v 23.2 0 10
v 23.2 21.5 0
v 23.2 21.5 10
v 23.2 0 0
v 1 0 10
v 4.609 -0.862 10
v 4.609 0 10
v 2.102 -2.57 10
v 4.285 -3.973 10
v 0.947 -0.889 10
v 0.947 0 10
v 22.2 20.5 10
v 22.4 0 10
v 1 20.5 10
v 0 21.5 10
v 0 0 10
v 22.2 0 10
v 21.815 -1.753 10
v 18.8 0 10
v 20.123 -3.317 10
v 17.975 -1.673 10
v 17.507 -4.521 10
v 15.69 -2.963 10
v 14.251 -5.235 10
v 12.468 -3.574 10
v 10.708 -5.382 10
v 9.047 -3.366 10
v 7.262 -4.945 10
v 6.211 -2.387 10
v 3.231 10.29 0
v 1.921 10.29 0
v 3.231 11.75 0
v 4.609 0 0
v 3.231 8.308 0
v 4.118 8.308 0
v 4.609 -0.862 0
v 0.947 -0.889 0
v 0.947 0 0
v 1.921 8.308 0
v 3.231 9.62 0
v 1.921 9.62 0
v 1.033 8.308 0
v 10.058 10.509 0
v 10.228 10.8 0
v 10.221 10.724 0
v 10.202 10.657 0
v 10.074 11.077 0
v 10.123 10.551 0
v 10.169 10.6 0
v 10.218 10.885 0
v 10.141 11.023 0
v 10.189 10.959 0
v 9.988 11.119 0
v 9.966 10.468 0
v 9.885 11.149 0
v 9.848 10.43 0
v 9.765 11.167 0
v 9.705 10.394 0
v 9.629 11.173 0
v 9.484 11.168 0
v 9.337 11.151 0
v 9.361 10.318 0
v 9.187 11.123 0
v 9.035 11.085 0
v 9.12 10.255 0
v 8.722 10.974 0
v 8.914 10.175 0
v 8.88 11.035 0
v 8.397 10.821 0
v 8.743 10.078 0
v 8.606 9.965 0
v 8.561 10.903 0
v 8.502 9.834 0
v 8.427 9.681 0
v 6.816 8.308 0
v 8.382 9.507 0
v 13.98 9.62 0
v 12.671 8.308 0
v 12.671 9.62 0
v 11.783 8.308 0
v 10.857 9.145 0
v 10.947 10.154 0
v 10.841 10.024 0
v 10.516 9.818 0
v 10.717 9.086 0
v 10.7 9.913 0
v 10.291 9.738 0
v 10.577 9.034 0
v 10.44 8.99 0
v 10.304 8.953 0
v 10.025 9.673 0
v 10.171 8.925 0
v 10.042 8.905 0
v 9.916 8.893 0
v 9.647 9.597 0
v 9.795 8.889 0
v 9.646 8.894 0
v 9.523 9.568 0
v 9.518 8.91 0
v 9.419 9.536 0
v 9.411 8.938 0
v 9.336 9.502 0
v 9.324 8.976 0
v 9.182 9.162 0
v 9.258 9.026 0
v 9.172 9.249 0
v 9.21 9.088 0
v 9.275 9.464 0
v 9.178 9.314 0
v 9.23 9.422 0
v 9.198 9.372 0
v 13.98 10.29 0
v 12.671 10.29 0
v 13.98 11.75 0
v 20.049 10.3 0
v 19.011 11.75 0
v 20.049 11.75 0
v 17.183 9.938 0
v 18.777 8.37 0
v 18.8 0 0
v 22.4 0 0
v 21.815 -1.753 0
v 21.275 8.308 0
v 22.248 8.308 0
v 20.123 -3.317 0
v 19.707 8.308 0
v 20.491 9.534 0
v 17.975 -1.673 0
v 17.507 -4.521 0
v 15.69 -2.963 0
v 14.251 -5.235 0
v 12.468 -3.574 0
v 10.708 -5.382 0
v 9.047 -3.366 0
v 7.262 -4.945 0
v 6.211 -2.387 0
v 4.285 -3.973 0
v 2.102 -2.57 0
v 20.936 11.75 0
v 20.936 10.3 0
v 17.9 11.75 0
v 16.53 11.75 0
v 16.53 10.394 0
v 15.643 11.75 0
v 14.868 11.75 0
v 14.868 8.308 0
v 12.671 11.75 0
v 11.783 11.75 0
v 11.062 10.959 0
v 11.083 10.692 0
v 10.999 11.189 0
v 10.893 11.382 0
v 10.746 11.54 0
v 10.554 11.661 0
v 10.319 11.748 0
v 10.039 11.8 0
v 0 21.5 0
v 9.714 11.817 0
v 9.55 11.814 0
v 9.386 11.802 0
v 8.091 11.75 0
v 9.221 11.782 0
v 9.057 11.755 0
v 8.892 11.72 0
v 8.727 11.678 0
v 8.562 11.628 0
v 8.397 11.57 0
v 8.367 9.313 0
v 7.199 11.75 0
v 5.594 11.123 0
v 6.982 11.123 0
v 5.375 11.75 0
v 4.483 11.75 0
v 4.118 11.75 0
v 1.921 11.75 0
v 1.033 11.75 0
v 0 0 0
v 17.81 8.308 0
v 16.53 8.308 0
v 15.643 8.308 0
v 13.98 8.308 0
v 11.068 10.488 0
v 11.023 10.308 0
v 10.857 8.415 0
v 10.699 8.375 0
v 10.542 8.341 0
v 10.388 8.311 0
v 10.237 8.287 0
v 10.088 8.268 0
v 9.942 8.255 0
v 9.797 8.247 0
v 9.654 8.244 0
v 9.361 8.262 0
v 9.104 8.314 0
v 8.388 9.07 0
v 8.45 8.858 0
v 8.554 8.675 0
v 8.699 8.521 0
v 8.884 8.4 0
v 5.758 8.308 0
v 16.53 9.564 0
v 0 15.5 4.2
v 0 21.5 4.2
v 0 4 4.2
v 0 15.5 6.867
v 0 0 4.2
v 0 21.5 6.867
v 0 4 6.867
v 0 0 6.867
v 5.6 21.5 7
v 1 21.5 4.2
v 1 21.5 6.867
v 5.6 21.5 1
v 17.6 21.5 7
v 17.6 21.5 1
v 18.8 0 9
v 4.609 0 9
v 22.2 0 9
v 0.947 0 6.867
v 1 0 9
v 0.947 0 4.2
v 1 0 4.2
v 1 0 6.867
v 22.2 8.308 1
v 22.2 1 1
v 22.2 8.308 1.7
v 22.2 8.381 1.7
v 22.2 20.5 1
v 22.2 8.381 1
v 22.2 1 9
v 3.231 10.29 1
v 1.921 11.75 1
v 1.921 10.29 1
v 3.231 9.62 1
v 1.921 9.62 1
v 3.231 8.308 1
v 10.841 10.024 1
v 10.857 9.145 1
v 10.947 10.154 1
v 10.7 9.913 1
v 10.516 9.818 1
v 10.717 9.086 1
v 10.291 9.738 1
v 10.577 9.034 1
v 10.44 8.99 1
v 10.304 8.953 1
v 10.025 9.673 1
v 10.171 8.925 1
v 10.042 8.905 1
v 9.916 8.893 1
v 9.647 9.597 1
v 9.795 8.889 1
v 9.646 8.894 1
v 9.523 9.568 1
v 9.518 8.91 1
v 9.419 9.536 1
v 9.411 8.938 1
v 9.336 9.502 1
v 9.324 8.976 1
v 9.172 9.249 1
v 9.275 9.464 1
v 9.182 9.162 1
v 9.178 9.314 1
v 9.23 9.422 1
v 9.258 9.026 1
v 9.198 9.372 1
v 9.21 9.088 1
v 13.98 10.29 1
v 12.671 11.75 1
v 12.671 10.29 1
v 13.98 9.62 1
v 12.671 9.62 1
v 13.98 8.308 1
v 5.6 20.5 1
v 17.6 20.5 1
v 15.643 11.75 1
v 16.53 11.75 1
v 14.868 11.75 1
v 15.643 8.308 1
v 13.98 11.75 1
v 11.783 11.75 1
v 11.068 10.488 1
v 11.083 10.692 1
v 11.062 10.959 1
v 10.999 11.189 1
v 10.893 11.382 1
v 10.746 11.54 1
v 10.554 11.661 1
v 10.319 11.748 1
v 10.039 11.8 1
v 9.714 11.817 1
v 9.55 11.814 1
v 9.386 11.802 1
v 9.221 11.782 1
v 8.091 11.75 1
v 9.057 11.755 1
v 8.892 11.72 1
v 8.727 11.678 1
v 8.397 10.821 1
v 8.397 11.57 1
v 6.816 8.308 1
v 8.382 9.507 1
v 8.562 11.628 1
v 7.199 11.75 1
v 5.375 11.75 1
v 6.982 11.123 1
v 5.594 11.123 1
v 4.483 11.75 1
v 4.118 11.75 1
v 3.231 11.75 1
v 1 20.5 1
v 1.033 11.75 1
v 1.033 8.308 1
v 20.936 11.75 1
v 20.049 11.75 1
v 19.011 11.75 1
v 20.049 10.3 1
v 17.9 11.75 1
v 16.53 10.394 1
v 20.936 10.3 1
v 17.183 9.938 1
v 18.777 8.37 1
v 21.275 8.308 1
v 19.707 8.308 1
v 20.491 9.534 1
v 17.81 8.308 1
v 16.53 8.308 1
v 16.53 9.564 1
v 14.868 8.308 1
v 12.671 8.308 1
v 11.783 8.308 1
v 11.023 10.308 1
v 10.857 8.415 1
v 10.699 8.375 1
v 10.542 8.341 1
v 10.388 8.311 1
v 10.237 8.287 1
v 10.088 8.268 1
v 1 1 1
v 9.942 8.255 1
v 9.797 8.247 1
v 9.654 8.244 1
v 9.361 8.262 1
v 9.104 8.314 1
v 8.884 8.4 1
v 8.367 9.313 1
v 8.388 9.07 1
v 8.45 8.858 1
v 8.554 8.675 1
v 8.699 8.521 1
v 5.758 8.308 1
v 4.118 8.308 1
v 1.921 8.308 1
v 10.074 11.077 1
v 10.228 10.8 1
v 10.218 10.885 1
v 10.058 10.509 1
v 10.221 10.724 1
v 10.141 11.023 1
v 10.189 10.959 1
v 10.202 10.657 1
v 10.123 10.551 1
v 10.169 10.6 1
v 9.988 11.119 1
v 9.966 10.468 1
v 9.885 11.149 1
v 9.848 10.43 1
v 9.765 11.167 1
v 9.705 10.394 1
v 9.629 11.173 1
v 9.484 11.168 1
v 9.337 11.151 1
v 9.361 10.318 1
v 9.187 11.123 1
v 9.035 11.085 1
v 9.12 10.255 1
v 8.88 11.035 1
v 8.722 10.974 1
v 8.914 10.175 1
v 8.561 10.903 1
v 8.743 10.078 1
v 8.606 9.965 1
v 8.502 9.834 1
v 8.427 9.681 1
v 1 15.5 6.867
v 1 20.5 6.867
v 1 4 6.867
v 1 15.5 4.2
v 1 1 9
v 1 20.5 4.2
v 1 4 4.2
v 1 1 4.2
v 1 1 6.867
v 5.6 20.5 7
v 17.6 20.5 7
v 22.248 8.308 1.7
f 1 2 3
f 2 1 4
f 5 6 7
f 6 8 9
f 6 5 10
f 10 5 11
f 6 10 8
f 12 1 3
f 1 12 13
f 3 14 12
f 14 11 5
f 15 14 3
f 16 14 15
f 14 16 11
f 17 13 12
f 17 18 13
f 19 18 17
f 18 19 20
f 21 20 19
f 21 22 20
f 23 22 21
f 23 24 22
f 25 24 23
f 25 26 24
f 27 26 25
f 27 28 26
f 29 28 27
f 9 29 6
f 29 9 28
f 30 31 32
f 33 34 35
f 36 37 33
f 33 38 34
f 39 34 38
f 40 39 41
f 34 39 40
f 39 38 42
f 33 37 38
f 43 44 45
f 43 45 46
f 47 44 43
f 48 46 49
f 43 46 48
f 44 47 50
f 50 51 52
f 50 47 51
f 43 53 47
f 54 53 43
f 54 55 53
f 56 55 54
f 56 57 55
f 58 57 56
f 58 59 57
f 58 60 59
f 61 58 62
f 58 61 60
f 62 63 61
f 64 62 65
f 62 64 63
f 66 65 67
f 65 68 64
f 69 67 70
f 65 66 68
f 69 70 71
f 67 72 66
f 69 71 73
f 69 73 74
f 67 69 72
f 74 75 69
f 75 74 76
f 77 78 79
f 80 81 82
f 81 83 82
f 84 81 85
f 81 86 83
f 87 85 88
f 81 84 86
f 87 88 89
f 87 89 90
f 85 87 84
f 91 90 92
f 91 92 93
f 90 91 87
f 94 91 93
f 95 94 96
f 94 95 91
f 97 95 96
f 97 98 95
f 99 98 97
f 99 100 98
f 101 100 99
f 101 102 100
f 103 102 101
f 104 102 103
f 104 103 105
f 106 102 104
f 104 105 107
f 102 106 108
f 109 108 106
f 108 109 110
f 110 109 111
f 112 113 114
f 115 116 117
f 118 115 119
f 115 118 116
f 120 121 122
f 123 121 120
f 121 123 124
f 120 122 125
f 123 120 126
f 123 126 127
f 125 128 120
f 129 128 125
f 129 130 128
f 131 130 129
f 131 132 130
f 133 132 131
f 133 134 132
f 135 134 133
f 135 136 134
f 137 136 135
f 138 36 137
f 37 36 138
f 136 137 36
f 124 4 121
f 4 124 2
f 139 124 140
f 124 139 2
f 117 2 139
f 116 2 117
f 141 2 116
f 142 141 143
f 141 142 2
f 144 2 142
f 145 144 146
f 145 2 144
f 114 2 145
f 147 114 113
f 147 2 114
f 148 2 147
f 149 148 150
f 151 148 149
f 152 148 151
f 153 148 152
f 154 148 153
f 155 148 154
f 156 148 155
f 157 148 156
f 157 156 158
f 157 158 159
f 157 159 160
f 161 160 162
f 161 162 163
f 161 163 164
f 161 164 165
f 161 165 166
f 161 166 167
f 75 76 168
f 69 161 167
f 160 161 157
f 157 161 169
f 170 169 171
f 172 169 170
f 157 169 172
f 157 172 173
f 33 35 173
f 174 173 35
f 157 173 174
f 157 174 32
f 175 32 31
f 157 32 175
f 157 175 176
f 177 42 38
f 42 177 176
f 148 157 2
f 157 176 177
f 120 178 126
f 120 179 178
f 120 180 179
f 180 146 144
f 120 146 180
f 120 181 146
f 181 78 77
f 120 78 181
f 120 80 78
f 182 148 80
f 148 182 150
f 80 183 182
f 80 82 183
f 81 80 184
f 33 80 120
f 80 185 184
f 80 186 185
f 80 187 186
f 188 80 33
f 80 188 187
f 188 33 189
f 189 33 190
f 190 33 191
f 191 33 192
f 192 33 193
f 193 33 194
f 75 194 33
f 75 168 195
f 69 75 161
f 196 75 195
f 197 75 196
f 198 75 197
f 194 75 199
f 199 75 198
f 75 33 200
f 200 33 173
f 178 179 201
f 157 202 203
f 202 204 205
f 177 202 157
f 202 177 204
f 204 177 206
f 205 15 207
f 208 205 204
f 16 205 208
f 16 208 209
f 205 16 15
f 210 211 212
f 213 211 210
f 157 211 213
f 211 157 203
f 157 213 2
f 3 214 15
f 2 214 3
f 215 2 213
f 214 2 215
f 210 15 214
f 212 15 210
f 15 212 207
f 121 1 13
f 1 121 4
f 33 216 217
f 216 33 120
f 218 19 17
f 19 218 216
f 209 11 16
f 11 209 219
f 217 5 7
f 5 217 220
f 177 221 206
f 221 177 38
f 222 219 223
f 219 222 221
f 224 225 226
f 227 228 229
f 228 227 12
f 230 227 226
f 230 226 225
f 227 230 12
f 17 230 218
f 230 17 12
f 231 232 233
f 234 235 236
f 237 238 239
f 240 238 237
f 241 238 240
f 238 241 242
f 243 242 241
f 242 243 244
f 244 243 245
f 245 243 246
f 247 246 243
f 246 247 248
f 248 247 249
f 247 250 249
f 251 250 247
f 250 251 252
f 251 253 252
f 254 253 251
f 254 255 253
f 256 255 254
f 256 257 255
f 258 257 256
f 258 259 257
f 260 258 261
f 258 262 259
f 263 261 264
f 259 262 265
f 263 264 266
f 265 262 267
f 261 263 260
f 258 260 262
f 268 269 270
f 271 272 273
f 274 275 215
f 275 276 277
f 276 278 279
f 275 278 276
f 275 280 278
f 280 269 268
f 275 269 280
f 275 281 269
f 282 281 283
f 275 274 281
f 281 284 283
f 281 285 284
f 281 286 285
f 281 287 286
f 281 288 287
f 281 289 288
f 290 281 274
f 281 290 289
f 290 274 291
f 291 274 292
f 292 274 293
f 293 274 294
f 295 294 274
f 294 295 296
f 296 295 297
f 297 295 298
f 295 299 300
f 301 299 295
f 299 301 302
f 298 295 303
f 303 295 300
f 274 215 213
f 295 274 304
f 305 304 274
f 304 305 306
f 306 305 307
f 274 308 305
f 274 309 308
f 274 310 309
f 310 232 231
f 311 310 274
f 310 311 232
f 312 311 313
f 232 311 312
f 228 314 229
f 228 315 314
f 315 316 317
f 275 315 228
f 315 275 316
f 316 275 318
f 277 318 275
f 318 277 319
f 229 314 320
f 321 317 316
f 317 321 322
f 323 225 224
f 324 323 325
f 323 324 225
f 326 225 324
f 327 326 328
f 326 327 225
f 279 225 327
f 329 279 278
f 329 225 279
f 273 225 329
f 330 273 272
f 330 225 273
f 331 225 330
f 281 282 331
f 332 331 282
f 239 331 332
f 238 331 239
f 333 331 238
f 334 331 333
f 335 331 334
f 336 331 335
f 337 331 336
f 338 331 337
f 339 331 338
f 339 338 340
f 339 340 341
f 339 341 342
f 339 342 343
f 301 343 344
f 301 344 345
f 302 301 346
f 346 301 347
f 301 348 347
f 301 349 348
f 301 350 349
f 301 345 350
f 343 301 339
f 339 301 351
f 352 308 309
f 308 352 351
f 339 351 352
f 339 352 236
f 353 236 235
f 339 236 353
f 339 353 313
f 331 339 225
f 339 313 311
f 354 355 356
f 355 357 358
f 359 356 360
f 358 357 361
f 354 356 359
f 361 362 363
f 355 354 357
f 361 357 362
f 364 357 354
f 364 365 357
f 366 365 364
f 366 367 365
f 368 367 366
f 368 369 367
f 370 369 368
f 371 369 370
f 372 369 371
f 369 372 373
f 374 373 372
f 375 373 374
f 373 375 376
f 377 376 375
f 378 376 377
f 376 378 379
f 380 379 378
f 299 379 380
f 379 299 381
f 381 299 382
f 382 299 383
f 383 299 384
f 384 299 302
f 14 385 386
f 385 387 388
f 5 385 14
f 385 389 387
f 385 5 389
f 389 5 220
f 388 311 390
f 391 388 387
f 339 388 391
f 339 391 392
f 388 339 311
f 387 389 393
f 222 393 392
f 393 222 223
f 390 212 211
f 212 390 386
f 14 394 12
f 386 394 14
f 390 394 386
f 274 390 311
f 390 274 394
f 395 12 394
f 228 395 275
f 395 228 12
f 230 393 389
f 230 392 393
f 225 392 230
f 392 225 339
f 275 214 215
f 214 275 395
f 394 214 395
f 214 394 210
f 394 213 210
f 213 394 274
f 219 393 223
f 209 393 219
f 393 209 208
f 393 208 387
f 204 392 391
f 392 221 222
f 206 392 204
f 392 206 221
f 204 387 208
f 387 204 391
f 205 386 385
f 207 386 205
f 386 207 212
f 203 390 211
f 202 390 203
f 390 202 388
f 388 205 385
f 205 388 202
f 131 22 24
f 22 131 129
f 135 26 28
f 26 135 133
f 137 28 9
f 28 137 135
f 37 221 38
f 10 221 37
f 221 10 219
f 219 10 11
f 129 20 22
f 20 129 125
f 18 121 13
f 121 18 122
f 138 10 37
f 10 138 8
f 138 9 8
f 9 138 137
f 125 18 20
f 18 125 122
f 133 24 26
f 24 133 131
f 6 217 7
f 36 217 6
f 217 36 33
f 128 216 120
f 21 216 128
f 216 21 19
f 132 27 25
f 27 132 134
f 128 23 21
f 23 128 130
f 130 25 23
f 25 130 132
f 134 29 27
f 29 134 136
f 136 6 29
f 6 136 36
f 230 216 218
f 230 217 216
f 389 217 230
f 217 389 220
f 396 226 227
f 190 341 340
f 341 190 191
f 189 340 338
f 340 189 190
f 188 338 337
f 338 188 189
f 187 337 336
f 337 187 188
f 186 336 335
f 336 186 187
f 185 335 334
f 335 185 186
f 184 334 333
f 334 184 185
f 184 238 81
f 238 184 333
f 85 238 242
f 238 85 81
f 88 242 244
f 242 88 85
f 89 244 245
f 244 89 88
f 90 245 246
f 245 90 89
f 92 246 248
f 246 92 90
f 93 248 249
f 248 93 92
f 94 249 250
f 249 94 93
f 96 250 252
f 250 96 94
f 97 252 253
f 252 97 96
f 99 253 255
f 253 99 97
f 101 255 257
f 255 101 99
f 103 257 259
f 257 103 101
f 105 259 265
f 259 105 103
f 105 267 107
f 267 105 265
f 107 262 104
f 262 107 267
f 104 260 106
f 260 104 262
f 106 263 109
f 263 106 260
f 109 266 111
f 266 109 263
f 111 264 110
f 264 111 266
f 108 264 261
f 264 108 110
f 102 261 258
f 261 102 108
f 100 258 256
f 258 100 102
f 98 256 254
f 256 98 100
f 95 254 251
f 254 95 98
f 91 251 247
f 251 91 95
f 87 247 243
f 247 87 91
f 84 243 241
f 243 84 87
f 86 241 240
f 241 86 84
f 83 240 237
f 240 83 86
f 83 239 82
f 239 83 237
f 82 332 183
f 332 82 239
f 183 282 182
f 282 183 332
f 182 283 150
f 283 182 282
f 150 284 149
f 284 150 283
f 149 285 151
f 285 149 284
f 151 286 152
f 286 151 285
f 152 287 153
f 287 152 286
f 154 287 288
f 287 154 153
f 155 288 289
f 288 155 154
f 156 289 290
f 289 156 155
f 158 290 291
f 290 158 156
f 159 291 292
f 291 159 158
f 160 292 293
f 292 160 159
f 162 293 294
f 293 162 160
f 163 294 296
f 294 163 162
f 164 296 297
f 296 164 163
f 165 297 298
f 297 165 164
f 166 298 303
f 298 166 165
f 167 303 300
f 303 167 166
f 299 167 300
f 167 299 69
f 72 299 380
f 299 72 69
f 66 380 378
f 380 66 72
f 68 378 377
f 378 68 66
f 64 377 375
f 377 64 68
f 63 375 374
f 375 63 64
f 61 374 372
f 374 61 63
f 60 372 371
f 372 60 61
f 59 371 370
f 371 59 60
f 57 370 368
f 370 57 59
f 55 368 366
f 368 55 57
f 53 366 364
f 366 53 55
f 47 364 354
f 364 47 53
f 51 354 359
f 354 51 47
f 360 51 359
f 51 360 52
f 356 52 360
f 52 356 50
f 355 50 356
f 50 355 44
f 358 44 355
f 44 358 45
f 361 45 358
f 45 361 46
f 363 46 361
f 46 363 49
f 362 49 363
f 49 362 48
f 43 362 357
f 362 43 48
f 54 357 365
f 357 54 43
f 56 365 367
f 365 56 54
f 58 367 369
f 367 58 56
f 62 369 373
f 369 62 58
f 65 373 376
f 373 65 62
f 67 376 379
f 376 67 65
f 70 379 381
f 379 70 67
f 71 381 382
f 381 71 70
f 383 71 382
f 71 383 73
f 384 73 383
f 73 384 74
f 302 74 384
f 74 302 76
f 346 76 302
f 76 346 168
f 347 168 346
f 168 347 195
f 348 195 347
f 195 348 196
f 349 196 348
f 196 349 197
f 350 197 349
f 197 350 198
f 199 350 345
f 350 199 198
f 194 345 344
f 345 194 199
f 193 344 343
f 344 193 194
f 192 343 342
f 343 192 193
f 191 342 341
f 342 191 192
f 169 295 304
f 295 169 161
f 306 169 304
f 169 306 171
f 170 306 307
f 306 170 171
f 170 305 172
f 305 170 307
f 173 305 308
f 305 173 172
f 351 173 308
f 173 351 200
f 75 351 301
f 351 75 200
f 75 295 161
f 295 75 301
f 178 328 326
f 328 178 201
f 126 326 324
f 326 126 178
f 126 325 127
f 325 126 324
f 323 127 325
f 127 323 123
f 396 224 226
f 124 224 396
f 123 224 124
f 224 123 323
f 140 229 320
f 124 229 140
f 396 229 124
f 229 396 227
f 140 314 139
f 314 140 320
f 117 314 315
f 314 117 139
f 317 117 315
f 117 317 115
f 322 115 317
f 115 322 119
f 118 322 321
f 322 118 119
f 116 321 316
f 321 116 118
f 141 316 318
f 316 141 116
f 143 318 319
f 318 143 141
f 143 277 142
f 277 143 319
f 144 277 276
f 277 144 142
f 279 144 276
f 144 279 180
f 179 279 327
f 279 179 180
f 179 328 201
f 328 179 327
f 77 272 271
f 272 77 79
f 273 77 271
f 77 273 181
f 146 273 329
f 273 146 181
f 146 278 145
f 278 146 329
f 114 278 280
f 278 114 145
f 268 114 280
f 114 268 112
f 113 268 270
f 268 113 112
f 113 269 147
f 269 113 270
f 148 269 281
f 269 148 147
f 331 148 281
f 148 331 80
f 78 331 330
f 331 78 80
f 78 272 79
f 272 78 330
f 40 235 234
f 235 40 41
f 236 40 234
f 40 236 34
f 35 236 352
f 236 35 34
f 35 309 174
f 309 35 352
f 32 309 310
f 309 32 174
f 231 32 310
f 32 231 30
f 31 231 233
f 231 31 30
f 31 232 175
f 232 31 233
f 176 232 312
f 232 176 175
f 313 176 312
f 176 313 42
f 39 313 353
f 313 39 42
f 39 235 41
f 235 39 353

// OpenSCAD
thick = 1;
length = 21.2;
width = 19.5;
height = 8;
slength = 6;
swidth = 7.5;
usb = 12;

/*u clamp thing*/
difference(){
union(){
difference(){
cube([length+2*thick,width+2*thick,height+2*thick]);
translate([ thick,thick,thick]) cube([length,width,height+thick]);
translate([ (length+2*thick-usb)/2,thick,thick]) cube([usb,width+thick,height*0.75]);
translate([0,-thick,thick*4.2]) cube([thick,thick*5,height/3]);
translate([0,width-thick*4,thick*4.2]) cube([thick,thick*6,height/3]);
}
/*translate([ thick,width-swidth+2*thick,height+thick]) cube([slength+thick,swidth,thick]);*/


translate([ length/2+thick,-0,0]) 

difference(){
scale([1.8,0.9,1]) difference(){
cylinder(height+2*thick,6,6);
cylinder(height+2*thick,4,4);
}
translate([-length,0,0])cube([2*length,width,height+2*thick]);

}
}

translate([thick,0,height+thick]) cube([length,thick,height/5]);
translate([length/4-4.7,width/2+2,0]) scale([0.34,0.34,0.34]) linear_extrude(5) rotate([180,0,0]) text("HASHKY",font = "Boulder:style=Bold");
translate([6.17,9.98,0]) cylinder(height+2*thick,1,1);
}
